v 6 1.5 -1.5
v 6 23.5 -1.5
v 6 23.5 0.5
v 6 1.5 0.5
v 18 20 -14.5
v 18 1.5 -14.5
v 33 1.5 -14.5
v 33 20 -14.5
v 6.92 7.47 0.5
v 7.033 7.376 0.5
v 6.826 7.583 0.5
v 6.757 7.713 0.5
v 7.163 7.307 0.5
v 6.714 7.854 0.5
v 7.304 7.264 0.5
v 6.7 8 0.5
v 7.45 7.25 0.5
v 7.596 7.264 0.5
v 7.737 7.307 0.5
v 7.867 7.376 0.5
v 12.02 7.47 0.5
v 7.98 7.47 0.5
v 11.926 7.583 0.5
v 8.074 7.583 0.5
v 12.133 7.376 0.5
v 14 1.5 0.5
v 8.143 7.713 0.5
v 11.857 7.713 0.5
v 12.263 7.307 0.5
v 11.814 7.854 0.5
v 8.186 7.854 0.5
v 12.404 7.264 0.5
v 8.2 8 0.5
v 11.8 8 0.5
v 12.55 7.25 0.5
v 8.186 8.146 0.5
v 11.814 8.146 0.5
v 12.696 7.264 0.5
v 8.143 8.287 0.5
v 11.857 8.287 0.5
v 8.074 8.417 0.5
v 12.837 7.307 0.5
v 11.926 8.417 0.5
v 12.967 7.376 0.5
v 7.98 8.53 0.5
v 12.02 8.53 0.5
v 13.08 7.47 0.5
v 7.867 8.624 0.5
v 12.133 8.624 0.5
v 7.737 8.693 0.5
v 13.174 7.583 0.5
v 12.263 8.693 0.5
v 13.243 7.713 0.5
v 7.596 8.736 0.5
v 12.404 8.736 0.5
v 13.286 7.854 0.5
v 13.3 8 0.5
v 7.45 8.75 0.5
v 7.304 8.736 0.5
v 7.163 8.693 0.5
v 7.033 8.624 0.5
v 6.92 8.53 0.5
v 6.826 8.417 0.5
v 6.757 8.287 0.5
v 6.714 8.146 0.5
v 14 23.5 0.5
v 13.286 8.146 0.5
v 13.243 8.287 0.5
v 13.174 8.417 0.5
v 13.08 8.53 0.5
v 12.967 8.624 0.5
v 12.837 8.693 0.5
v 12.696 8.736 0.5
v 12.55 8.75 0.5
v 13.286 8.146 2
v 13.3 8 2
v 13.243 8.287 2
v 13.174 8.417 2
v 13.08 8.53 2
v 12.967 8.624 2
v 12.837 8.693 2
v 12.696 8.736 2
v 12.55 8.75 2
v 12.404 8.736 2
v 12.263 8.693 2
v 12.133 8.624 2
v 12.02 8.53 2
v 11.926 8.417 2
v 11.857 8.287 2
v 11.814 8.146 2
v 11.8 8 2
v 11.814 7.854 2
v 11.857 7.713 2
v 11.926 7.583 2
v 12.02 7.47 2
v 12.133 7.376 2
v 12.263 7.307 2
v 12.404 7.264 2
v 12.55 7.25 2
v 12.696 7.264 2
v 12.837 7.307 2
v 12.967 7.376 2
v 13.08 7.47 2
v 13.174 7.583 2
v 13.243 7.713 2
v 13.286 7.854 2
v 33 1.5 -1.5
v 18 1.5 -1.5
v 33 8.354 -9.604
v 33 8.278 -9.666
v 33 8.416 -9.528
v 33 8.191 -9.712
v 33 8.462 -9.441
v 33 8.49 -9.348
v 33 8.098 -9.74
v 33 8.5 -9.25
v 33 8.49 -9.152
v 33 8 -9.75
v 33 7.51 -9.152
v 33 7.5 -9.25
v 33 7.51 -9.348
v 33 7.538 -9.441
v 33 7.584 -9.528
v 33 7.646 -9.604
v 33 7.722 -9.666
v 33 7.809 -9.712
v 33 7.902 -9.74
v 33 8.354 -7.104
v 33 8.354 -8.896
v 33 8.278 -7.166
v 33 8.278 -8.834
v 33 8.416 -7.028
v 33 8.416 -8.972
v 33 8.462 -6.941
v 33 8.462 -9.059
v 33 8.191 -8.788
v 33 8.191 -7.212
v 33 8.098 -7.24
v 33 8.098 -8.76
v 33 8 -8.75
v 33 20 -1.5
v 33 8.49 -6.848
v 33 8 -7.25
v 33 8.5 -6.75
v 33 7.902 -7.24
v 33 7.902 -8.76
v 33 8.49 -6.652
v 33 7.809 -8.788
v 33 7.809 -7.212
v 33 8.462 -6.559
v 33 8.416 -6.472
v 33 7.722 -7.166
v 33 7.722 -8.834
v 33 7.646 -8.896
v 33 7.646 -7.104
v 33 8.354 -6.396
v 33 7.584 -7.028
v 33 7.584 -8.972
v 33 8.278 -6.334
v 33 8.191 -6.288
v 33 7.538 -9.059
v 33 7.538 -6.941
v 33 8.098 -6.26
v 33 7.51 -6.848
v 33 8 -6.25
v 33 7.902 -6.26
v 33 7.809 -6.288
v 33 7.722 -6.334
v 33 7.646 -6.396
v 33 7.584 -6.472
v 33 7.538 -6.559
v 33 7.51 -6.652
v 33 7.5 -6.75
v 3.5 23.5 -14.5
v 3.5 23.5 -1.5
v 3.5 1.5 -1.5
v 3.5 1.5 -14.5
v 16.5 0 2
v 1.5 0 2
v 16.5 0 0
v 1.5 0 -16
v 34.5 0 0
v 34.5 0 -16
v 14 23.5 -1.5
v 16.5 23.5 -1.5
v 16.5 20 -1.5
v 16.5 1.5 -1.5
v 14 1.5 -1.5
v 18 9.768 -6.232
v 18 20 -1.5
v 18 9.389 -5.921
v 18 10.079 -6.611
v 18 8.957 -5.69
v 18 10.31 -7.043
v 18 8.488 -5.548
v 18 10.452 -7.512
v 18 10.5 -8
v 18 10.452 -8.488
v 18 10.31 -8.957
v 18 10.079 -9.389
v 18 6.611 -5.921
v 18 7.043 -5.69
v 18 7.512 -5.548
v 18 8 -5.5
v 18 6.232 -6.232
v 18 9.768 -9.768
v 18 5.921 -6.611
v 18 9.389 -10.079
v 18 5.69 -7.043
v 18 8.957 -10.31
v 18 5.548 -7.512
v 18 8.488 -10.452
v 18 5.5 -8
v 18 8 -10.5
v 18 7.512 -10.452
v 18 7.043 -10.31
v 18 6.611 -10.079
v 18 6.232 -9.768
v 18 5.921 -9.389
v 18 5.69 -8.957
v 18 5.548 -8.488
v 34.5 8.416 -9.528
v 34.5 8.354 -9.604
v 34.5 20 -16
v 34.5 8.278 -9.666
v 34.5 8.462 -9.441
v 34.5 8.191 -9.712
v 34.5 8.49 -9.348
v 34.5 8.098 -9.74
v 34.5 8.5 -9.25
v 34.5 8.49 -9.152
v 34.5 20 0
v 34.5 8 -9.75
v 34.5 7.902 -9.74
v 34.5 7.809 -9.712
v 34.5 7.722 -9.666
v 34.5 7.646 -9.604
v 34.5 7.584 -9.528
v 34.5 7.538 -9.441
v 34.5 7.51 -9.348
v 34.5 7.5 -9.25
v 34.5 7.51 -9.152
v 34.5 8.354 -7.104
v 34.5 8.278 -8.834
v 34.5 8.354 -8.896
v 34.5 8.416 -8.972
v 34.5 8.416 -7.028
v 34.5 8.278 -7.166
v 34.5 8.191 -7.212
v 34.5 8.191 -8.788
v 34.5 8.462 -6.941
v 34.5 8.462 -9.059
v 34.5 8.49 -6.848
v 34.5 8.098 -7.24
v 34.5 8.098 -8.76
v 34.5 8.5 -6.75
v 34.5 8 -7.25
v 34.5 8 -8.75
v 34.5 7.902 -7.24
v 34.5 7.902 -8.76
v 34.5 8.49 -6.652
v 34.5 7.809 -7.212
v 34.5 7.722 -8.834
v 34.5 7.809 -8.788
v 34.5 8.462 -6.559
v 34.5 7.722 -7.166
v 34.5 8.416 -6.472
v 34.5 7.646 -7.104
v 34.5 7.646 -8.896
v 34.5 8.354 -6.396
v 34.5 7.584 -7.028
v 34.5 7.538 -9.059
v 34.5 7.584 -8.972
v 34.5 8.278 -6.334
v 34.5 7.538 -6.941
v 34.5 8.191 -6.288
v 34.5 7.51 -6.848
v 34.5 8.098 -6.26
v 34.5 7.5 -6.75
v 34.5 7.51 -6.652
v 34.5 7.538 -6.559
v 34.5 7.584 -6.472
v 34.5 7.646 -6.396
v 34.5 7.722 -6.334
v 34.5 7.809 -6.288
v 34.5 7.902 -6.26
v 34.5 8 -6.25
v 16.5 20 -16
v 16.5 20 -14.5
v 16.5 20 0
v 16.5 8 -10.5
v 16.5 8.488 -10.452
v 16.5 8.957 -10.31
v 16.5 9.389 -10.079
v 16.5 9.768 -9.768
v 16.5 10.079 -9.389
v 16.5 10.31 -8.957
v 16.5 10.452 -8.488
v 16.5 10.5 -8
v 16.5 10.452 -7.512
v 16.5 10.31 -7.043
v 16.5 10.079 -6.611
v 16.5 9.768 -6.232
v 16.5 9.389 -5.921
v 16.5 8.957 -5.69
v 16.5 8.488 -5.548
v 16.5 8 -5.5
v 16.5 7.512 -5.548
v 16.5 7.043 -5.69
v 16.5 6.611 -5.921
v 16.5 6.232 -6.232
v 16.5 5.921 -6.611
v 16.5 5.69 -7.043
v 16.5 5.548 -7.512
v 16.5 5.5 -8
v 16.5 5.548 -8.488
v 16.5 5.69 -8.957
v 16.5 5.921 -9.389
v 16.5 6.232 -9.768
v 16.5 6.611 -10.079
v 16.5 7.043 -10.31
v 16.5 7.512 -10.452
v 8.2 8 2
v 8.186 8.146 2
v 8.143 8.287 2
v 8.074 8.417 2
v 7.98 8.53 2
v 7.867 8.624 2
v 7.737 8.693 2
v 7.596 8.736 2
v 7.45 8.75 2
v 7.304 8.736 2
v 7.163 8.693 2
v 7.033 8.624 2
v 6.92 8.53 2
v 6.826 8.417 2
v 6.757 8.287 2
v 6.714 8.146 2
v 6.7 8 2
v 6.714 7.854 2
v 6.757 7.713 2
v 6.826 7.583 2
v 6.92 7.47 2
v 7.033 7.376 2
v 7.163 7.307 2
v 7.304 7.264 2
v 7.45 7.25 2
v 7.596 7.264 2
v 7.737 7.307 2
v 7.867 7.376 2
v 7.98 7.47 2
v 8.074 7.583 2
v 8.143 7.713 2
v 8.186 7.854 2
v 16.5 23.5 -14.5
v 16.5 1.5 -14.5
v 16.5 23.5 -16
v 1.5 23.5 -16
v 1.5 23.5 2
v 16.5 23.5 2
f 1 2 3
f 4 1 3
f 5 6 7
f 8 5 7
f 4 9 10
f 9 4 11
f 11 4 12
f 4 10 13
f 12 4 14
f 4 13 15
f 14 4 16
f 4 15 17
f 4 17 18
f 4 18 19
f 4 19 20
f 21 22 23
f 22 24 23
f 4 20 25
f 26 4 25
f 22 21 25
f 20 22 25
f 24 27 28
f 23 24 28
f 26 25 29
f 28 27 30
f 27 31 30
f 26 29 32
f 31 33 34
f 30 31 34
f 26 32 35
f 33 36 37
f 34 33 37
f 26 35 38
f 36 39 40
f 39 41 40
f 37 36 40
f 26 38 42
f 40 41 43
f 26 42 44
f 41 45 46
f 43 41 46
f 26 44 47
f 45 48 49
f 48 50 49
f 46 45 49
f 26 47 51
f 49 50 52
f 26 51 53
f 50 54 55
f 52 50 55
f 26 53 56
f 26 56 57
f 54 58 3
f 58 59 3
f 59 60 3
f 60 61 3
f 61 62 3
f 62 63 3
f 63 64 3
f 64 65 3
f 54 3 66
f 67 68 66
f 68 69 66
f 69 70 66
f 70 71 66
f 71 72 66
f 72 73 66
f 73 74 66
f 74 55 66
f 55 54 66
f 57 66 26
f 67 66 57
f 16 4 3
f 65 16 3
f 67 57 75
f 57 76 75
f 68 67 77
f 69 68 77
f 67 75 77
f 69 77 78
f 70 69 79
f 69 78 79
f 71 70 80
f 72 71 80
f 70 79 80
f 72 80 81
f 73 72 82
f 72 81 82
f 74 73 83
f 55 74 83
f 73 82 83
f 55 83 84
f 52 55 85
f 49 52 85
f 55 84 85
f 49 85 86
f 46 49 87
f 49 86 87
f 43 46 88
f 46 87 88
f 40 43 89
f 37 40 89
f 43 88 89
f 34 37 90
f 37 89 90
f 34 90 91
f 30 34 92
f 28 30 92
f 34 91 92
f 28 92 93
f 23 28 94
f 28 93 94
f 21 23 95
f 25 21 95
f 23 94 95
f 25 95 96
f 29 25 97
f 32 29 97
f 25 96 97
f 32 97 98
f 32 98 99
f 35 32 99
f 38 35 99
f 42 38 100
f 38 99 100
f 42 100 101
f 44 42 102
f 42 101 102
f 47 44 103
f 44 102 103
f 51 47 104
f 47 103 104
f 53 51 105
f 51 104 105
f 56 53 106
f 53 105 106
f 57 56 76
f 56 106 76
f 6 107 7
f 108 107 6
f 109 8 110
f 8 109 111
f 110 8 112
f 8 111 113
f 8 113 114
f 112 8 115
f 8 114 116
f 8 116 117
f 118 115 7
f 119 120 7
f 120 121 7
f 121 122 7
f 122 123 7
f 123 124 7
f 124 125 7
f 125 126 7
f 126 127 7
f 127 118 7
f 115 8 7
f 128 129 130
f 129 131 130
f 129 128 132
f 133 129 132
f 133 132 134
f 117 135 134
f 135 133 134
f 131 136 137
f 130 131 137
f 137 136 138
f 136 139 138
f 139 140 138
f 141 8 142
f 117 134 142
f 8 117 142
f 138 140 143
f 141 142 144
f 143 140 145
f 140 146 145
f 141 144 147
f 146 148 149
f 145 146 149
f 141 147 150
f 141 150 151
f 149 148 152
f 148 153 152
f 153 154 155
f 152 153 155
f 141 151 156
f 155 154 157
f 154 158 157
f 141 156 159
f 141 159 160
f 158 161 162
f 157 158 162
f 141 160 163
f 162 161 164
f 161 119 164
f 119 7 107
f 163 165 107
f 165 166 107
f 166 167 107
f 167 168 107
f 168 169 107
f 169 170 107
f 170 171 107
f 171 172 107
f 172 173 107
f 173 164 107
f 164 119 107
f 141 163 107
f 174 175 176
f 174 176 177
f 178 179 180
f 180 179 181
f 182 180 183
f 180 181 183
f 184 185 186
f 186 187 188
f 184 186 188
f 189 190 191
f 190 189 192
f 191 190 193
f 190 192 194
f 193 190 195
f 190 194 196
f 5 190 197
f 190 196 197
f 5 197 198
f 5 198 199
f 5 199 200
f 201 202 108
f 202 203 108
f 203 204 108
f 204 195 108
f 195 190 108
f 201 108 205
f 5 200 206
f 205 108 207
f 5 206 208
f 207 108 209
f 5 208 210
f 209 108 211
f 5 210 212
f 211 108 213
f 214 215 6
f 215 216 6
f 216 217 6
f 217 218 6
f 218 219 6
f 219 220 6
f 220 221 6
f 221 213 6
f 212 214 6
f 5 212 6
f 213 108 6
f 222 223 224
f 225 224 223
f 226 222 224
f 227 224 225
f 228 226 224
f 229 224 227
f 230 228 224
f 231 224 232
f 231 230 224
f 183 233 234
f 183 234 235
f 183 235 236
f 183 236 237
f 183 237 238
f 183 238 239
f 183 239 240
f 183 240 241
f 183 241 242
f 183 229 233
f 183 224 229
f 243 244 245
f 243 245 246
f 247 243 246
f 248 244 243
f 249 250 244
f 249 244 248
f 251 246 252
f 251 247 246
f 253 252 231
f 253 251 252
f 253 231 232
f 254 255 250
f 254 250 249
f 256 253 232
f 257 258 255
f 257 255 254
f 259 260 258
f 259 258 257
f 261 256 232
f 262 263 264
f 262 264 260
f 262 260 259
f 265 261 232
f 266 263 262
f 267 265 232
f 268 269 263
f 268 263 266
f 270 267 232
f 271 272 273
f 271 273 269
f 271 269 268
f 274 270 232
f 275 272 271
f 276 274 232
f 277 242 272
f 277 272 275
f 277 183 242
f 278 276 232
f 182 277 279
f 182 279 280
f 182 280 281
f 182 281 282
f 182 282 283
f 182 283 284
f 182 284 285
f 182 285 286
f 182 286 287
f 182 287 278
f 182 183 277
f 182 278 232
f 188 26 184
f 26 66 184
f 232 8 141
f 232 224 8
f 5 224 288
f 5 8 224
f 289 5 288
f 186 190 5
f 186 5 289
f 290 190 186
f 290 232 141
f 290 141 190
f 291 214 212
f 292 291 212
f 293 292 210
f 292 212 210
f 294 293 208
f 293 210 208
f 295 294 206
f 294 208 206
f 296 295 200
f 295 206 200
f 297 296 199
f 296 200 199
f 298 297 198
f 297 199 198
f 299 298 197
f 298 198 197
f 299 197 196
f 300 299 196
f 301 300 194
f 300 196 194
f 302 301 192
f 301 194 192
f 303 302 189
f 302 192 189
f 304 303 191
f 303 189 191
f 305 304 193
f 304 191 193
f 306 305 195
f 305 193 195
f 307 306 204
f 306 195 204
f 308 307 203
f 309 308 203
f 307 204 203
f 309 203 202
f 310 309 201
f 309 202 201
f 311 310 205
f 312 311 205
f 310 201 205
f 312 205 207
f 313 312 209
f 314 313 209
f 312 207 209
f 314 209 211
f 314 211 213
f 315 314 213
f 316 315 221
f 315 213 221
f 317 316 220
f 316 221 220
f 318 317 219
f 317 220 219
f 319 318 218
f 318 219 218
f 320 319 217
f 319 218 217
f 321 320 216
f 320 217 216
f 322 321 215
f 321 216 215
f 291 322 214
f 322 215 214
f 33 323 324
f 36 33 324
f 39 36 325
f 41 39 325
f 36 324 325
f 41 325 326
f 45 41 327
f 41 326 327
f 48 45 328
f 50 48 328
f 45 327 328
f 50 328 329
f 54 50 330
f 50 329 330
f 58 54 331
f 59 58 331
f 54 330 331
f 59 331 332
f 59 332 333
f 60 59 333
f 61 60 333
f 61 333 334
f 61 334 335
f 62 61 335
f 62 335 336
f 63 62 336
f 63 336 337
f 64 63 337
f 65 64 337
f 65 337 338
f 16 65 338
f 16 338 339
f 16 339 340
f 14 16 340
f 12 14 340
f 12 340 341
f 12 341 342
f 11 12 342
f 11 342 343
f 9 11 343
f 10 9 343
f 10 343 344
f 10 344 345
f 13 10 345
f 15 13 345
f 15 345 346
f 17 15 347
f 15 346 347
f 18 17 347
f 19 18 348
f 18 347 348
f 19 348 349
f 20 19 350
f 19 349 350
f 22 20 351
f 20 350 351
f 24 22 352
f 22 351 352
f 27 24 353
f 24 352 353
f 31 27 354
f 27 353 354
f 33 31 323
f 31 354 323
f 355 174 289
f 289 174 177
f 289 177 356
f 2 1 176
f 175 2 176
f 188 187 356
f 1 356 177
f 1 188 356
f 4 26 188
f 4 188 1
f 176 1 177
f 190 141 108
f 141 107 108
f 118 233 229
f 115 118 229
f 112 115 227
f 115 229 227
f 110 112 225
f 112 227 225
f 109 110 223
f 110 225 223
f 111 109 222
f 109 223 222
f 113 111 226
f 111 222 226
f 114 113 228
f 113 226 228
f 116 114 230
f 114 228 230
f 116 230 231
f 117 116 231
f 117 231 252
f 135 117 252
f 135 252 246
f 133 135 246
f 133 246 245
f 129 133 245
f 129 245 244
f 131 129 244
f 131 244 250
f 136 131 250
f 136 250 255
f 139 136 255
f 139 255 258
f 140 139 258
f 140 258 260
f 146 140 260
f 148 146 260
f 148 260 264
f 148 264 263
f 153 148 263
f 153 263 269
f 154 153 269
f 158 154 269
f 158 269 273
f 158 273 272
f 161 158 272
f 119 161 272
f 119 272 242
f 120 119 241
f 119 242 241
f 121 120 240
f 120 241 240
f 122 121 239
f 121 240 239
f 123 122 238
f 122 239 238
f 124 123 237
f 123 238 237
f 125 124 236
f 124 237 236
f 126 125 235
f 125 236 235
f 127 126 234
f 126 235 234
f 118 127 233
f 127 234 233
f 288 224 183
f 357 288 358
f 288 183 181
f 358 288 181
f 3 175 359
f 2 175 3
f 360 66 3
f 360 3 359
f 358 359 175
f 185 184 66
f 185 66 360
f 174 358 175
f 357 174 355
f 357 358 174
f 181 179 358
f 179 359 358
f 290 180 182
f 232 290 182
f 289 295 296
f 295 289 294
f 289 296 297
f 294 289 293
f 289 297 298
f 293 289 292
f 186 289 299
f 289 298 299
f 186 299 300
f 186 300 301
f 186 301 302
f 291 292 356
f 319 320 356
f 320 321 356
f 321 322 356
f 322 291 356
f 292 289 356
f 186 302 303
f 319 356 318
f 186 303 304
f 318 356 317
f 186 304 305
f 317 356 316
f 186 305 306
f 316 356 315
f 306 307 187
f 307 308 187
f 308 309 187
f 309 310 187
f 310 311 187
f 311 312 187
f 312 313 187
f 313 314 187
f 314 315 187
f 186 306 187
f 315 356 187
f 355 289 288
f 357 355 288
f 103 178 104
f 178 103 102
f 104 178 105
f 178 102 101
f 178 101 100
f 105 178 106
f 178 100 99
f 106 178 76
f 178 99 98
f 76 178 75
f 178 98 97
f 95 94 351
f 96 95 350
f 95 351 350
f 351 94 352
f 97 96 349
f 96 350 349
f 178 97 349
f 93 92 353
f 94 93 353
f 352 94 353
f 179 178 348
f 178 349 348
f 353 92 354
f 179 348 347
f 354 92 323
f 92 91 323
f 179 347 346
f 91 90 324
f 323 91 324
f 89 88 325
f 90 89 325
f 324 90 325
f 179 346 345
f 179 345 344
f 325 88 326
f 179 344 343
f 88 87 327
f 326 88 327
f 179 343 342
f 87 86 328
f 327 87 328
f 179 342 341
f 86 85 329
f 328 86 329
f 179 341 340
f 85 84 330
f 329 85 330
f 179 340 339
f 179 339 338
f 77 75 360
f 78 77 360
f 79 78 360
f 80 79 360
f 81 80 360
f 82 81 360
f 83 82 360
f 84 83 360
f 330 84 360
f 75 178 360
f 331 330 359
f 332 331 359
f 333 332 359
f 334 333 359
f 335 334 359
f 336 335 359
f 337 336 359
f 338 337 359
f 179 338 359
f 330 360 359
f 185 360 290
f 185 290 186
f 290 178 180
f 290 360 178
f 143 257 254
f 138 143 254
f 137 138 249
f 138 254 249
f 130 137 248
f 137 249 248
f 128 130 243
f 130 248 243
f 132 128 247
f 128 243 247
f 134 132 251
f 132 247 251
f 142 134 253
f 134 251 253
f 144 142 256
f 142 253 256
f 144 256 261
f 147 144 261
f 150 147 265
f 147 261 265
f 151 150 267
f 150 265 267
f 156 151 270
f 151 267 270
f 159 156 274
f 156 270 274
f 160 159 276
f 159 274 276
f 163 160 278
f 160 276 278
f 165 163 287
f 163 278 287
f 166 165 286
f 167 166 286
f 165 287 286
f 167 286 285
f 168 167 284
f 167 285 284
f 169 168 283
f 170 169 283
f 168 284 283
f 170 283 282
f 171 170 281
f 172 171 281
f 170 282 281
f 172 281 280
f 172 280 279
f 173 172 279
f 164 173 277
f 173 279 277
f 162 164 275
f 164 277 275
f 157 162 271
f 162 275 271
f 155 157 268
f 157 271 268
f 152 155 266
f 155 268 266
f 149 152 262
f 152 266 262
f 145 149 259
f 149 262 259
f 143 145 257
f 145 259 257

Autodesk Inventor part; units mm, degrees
ref_plane "YZ Plane" through (0, 0, 0) normal (1, 0, 0) x (0, 1, 0)
ref_plane "XZ Plane" through (0, 0, 0) normal (0, 1, 0) x (-1, 0, 0)
ref_plane "XY Plane" through (0, 0, 0) normal (0, 0, 1) x (1, 0, 0)
sketch "Esboço1" plane through (0, 0, 0) normal (0, 1, 0) x (-1, 0, 0)
  line L0 (0, 0) -> (0, -16)
  line L1 (0, -16) -> (-34.5, -16)
  line L2 (-34.5, -16) -> (-34.5, 0)
  line L3 (-34.5, 0) -> (0, 0)
  line L4 (-3.5, -14.5) -> (-16.5, -14.5)
  line L5 (-16.5, -14.5) -> (-16.5, -1.5)
  line L6 (-16.5, -1.5) -> (-3.5, -1.5)
  line L7 (-18, -14.5) -> (-33, -14.5)
  line L8 (-33, -14.5) -> (-33, -1.5)
  line L9 (-33, -1.5) -> (-18, -1.5)
  line L10 (-18, -1.5) -> (-18, -14.5)
  line L11 (-3.5, -14.5) -> (-3.5, -12)
  line L12 (-3.5, -12) -> (-1.5, -12)
  line L13 (-1.5, -12) -> (-1.5, -4)
  line L14 (-1.5, -4) -> (-3.5, -4)
  line L15 (-3.5, -4) -> (-3.5, -1.5)
  point P0 (-34.5, -8)
  dimension "d0" = 13
  dimension "d1" = 13
  dimension "d2" = 15
  dimension "d3" = 13
  dimension "d4" = 8
  dimension "d5" = 2.5
  dimension "d6" = 1.5
  dimension "d7" = 1.5
  dimension "d8" = 2
  dimension "d9" = 1.5
  dimension "d10" = 1.5
  dimension "d11" = 1.5
extrude "Extrusão1" add sketch "Esboço1" along normal blind 1.5 contours L4 L5 L6 L15 L14 L13 L12 L11 | L7 L8 L9 L10
extrude "Extrusão2" add sketch "Esboço1" along normal blind 20
sketch "Esboço2" plane through (0, 0, -16) normal (-1, 0, 0) x (0, 0, 1)
  line L0 (12, 20) -> (4, 20) projected
  line L1 (8, 20) -> (8, 0)
  line L2 (0, 0) -> (0, 20) projected
  circle A0 centre (5.45, 8) radius 0.5
  circle A1 centre (10.55, 8) radius 0.5
  line L3 (0, 0) -> (16, 0) projected
  dimension "d23" = 8
extrude "Extrusão3" cut sketch "Esboço2" against normal blind 10
sketch "Esboço3" plane through (34.5, 0, 0) normal (1, 0, 0) x (0, 0, -1)
  line L0 (0, 20) -> (16, 20) projected
  line L1 (8, 20) -> (8, 0)
  circle A0 centre (6.75, 8) radius 0.5
  circle A1 centre (9.25, 8) radius 0.5
  line L2 (0, 0) -> (16, 0) projected
  line L3 (11, 16) -> (11, 8)
  line L4 (11, 8) -> (5, 8)
  line L5 (5, 8) -> (5, 16)
  circle A2 centre (5, 12) radius 1.5
  circle A3 centre (11, 12) radius 1.5
  dimension "d26" = 1
  dimension "d27" = 1
  dimension "d28" = 8
  dimension "d29" = 8
  dimension "d30" = 1.25
  dimension "d31" = 1.25
  dimension "d78" = 3
  dimension "d79" = 3
  dimension "d80" = 3
  dimension "d81" = 3
extrude "Extrusão4" cut sketch "Esboço3" against normal blind 10 contours L4 A0 | A1 L4 | L4 A1 | A0 L4
sketch "Esboço4" plane through (18, 1.5, -14.5) normal (1, 0, 0) x (0, 0, -1)
  line L0 (-14.5, -1.5) -> (1.5, -1.5) projected
  line L1 (-6.5, -1.5) -> (-6.5, 18.5)
  line L2 (0, 18.5) -> (-13, 18.5) projected
  circle A0 centre (-6.5, 6.5) radius 2.5
  line L3 (0, 0) -> (-13, 0) projected
  dimension "d40" = 5
  dimension "d42" = 6.5
extrude "Extrusão5" cut sketch "Esboço4" against normal blind 10
sketch "Esboço6" plane through (0, 20, 0) normal (0, 1, 0) x (1, 0, 0)
  line L0 (0, 0) -> (34.5, 0) projected
  line L1 (0, 0) -> (16.5, 0)
  line L2 (0, 0) -> (16.5, 0) construction
  line L3 (16.5, 14.5) -> (16.5, 1.5) projected
  line L4 (16.5, 0) -> (16.5, 1.5)
  line L5 (16.5, 1.5) -> (3.5, 1.5) projected
  line L6 (16.5, 1.5) -> (3.5, 1.5)
  line L7 (3.5, 1.5) -> (3.5, 4) projected
  line L8 (3.5, 1.5) -> (3.5, 4)
  line L9 (3.5, 4) -> (1.5, 4) projected
  line L10 (3.5, 4) -> (1.5, 4)
  line L11 (1.5, 4) -> (1.5, 12)
  line L12 (1.5, 12) -> (3.5, 12) projected
  line L13 (1.5, 12) -> (3.5, 12)
  line L14 (3.5, 12) -> (3.5, 14.5) projected
  line L15 (3.5, 12) -> (3.5, 14.5)
  line L16 (3.5, 14.5) -> (16.5, 14.5) projected
  line L17 (3.5, 14.5) -> (16.5, 14.5)
  line L18 (16.5, 14.5) -> (16.5, 16)
  line L19 (34.5, 16) -> (0, 16) projected
  line L20 (0, 16) -> (0, 0) projected
  line L21 (0, 16.0004) -> (0, 0)
  dimension "d66" = 16.5
  dimension "d67" = 0
extrude "Extrusão8" add sketch "Esboço6" along normal blind 3.5 contours L20 L19 L18 L16 L14 L12 L11 L9 L7 L5 L4 L0
sketch "Sketch8" plane through (0, 23.5, 0) normal (0, 1, 0) x (1, 0, 0)
  line L0 (3.5, 1.5) -> (16.5, 1.5) projected
  line L1 (6, 1.5) -> (6, -0.5)
  line L2 (6, -0.5) -> (14, -0.5)
  line L3 (14, -0.5) -> (14, 1.5)
  line L4 (16.5, 1.5) -> (14, 1.5)
  line L5 (3.5, 1.5) -> (3.5, -2)
  line L6 (3.5, -2) -> (16.5, -2)
  line L7 (16.5, -2) -> (16.5, 1.5)
  line L8 (0, 0) -> (34.5, 0) projected
  point P0 (6, 0)
  point P1 (14, 0)
  dimension "d86" = 8
  dimension "d87" = 2.5
  dimension "d88" = 2
  dimension "d89" = 2
  dimension "d90" = 3.5
extrude "Extrusion12" add sketch "Sketch8" against normal up to surface (23.5 mm away) contours L0 L1 L8 L5 | L8 L1 L2 L3 L7 L6 L5 | L0 L7 L8 L3
extrude "Extrusion13" cut sketch "Sketch8" against normal blind 22 contours L0 L3 L8 L1
sketch "Sketch9" plane through (0, 23.5, 0) normal (0, 1, 0) x (1, 0, 0)
  line L0 (34.5, 16) -> (0, 16) projected
  line L1 (0, 0) -> (3.5, 0) projected
  line L2 (0, 16) -> (1.5, 16)
  line L3 (1.5, 16) -> (1.5, 0)
  line L4 (1.5, 0) -> (0, 0)
  line L5 (0, 0) -> (0, 16)
  line L6 (3.5, 12) -> (1.5, 12) projected
  line L7 (3.5, 1.5) -> (3.5, 4) projected
  line L8 (3.5, 12) -> (3.5, 4)
  dimension "d95" = 1.5
extrude "Extrusion14" cut sketch "Sketch9" against normal through all
sketch "Sketch10" plane through (0, 23.5, 0) normal (0, 1, 0) x (1, 0, 0)
  line L0 (3.5, 14.5) -> (3.5, 12) projected
  line L1 (1.5, 12) -> (1.5, 4) projected
  line L2 (3.5, 12) -> (1.5, 12)
  line L3 (1.5, 12) -> (1.5, 4)
  line L4 (1.5, 4) -> (3.5, 4)
  line L5 (3.5, 4) -> (3.5, 12)
  point P0 (0, 0)
extrude "Extrusion15" add sketch "Sketch10" against normal up to surface (22 mm away)
sketch "Sketch11" plane through (0, 0, 0) normal (0, -1, 0) x (1, 0, 0)
  line L0 (6, 0) -> (14, 0) projected
  line L1 (6, 0.5) -> (14, 0.5) projected
  line L2 (6, 0) -> (14, 0)
  line L3 (14, 0) -> (14, 0.5)
  line L4 (14, 0.5) -> (6, 0.5)
  line L5 (6, 0.5) -> (6, 0)
  point P0 (0, 0)
extrude "Extrusion16" add sketch "Sketch11" against normal blind 1.5
sketch "Sketch12" plane through (0, 23.5, 0) normal (0, 1, 0) x (1, 0, 0)
  line L0 (1.5, 16) -> (1.5, 0) projected
  line L1 (3.5, -2) -> (3.5, 0) projected
  line L2 (1.5, 0) -> (3.5, 0)
  line L3 (3.5, 0) -> (3.5, -2)
  line L4 (3.5, -2) -> (1.5, -2)
  line L5 (1.5, -2) -> (1.5, 0)
  point P0 (0, 0)
extrude "Extrusion17" add sketch "Sketch12" against normal up to surface (23.5 mm away)
sketch "Sketch13" plane through (16.5, 0, 2) normal (0, 0, 1) x (1, 0, 0)
  line L0 (-13, 23.5) -> (0, 23.5) projected
  line L1 (-6.5, 23.5) -> (-6.5, 0)
  circle A0 centre (-3.95, 8) radius 0.75
  circle A1 centre (-9.05, 8) radius 0.75
  line L2 (0, 0) -> (-15, 0) projected
  line L3 (0, 23.5) -> (0, 0) projected
  point P0 (-16.5, 0)
  dimension "d104" = 1.5
  dimension "d105" = 1.5
  dimension "d106" = 8
  dimension "d107" = 8
  dimension "d108" = 6.5
  dimension "d109" = 2.55
  dimension "d110" = 2.55
extrude "Extrusion18" cut sketch "Sketch13" against normal blind 10 contours A0 | A1
properties part number "Base_3DPrint"
